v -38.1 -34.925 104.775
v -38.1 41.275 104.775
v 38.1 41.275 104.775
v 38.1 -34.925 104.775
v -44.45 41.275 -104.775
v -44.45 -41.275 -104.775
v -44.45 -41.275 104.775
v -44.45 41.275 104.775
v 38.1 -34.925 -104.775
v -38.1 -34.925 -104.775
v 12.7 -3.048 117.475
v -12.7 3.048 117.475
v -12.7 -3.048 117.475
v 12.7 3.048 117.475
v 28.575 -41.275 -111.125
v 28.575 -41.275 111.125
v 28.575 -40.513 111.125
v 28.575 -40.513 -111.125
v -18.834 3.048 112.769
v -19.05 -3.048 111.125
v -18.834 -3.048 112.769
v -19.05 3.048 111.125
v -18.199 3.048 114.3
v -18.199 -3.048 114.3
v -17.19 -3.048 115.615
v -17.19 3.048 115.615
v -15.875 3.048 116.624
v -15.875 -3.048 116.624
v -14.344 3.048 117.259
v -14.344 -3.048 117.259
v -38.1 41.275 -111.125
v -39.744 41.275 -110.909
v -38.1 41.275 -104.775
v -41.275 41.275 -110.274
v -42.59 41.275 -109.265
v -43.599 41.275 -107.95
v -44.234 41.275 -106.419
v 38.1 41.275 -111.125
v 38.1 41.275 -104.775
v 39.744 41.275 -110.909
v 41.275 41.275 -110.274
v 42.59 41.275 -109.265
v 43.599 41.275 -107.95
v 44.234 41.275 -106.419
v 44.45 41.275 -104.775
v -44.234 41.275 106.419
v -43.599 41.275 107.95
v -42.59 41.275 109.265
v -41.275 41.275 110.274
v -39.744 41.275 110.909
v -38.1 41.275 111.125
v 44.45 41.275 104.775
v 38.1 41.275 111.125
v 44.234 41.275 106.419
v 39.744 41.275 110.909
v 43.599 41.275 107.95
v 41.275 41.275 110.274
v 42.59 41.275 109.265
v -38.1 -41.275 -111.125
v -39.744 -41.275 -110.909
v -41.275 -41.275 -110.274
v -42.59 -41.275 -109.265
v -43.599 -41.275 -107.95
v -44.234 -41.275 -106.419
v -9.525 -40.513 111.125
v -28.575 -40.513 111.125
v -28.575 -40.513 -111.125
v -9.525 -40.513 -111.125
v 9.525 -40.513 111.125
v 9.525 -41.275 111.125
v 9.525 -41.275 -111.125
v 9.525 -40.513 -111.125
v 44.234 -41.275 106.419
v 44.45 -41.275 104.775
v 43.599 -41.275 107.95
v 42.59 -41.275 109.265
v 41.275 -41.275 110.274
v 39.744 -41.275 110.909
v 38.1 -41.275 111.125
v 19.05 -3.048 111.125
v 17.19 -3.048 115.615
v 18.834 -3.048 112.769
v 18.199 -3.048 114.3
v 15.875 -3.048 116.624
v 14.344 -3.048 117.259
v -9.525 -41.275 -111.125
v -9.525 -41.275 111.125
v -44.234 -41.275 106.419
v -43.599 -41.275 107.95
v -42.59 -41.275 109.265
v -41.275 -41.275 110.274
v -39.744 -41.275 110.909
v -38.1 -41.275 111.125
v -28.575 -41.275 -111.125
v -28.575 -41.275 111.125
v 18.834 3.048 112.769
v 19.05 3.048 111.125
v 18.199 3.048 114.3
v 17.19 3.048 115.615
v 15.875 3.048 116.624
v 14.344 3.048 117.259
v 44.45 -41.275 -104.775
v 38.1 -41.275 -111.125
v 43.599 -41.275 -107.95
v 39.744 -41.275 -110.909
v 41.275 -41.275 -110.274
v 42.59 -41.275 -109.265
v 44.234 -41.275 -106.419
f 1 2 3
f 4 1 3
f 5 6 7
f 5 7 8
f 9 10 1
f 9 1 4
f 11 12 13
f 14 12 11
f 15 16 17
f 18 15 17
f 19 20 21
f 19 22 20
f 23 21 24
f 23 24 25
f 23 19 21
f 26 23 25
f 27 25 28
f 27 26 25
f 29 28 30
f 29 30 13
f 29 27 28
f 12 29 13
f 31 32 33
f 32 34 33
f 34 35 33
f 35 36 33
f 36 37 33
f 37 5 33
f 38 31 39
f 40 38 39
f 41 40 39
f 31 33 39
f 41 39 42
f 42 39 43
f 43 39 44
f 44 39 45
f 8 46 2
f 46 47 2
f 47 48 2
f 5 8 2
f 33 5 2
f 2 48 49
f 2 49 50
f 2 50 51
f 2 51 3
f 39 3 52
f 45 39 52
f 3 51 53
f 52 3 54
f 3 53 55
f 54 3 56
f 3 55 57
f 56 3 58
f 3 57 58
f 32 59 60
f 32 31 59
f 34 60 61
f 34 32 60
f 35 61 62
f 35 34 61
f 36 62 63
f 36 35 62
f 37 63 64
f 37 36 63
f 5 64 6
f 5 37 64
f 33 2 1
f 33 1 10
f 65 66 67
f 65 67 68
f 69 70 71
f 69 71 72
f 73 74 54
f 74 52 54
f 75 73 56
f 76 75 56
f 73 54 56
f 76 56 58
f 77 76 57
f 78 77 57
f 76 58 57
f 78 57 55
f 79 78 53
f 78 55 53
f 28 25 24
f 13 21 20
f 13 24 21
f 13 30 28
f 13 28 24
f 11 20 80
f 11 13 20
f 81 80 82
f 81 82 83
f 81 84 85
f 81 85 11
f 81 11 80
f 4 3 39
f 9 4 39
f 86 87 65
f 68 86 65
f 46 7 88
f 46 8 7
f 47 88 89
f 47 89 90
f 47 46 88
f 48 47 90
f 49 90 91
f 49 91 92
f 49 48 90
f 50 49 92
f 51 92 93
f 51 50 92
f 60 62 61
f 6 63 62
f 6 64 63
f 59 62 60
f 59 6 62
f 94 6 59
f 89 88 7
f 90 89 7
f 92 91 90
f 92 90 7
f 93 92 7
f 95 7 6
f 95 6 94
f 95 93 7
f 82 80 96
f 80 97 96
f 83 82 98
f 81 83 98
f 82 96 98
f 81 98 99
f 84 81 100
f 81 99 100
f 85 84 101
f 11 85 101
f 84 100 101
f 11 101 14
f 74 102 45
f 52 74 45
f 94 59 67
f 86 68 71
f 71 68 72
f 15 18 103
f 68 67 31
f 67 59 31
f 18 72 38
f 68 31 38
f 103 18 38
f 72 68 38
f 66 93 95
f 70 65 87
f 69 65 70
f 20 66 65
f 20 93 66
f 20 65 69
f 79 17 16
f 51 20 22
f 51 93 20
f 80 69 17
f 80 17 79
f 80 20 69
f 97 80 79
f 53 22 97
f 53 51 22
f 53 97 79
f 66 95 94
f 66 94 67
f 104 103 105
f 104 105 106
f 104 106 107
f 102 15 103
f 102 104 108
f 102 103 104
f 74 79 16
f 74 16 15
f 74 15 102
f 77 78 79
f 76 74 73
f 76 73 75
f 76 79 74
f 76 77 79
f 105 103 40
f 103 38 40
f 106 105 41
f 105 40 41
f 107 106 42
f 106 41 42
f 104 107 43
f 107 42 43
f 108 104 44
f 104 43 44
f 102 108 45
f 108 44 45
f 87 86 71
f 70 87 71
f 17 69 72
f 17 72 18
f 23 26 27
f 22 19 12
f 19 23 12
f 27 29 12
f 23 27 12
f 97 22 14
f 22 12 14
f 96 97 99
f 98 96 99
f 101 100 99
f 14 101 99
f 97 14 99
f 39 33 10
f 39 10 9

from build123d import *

# Parameters (mm, degrees)
SKETCH1_W           = 88.9
SKETCH1_H           = 82.55
BOSS_EXTRUDE1_DEPTH = 111.125
SKETCH2_W           = 76.2
SKETCH2_H           = 209.55
CUT_EXTRUDE1_DEPTH  = 76.2
SKETCH3_W           = 38.1
SKETCH3_H           = 6.096
BOSS_EXTRUDE2_DEPTH = 6.35
SKETCH4_W           = 19.05
SKETCH4_H           = 0.762
CUT_EXTRUDE2_DEPTH  = 231.379015158
FILLET1_R           = 6.35
FILLET2_R           = 6.35


with BuildPart() as part:
    # Sketch1 → Boss-Extrude1 (new, symmetric)
    with BuildSketch(Plane.XY):
        Rectangle(SKETCH1_W, SKETCH1_H)
    extrude(amount=BOSS_EXTRUDE1_DEPTH, both=True)

    # Sketch2 → Cut-Extrude1 (cut)
    with BuildSketch(Plane(origin=(0, 41.275, 0), x_dir=(1, 0, 0), z_dir=(0, 1, 0))):
        Rectangle(SKETCH2_W, SKETCH2_H)
    extrude(amount=-CUT_EXTRUDE1_DEPTH, mode=Mode.SUBTRACT)

    # Sketch3 → Boss-Extrude2 (add, symmetric)
    with BuildSketch(Plane.XY.offset(111.125)):
        Rectangle(SKETCH3_W, SKETCH3_H)
    extrude(amount=BOSS_EXTRUDE2_DEPTH, both=True)

    # Sketch4 → Cut-Extrude2 (cut, through all)
    with BuildSketch(Plane.XY.offset(111.125)):
        with Locations((-19.05, -40.894)):
            Rectangle(SKETCH4_W, SKETCH4_H)
        with Locations((19.05, -40.894)):
            Rectangle(SKETCH4_W, SKETCH4_H)
    extrude(amount=-CUT_EXTRUDE2_DEPTH, mode=Mode.SUBTRACT)

    # Fillet1
    fillet1_edges = [part.edges().sort_by_distance(p)[0] for p in [
        (44.45, 0, 111.125),
        (44.45, 0, -111.125),
        (-44.45, 0, -111.125),
        (-44.45, 0, 111.125),
    ]]
    fillet(fillet1_edges, radius=FILLET1_R)

    # Fillet2
    fillet2_edges = [part.edges().sort_by_distance(p)[0] for p in [
        (19.05, 0, 117.475),
        (-19.05, 0, 117.475),
    ]]
    fillet(fillet2_edges, radius=FILLET2_R - 0.0001)  # a hair under: the kernel refuses the full size


solid = part.part
